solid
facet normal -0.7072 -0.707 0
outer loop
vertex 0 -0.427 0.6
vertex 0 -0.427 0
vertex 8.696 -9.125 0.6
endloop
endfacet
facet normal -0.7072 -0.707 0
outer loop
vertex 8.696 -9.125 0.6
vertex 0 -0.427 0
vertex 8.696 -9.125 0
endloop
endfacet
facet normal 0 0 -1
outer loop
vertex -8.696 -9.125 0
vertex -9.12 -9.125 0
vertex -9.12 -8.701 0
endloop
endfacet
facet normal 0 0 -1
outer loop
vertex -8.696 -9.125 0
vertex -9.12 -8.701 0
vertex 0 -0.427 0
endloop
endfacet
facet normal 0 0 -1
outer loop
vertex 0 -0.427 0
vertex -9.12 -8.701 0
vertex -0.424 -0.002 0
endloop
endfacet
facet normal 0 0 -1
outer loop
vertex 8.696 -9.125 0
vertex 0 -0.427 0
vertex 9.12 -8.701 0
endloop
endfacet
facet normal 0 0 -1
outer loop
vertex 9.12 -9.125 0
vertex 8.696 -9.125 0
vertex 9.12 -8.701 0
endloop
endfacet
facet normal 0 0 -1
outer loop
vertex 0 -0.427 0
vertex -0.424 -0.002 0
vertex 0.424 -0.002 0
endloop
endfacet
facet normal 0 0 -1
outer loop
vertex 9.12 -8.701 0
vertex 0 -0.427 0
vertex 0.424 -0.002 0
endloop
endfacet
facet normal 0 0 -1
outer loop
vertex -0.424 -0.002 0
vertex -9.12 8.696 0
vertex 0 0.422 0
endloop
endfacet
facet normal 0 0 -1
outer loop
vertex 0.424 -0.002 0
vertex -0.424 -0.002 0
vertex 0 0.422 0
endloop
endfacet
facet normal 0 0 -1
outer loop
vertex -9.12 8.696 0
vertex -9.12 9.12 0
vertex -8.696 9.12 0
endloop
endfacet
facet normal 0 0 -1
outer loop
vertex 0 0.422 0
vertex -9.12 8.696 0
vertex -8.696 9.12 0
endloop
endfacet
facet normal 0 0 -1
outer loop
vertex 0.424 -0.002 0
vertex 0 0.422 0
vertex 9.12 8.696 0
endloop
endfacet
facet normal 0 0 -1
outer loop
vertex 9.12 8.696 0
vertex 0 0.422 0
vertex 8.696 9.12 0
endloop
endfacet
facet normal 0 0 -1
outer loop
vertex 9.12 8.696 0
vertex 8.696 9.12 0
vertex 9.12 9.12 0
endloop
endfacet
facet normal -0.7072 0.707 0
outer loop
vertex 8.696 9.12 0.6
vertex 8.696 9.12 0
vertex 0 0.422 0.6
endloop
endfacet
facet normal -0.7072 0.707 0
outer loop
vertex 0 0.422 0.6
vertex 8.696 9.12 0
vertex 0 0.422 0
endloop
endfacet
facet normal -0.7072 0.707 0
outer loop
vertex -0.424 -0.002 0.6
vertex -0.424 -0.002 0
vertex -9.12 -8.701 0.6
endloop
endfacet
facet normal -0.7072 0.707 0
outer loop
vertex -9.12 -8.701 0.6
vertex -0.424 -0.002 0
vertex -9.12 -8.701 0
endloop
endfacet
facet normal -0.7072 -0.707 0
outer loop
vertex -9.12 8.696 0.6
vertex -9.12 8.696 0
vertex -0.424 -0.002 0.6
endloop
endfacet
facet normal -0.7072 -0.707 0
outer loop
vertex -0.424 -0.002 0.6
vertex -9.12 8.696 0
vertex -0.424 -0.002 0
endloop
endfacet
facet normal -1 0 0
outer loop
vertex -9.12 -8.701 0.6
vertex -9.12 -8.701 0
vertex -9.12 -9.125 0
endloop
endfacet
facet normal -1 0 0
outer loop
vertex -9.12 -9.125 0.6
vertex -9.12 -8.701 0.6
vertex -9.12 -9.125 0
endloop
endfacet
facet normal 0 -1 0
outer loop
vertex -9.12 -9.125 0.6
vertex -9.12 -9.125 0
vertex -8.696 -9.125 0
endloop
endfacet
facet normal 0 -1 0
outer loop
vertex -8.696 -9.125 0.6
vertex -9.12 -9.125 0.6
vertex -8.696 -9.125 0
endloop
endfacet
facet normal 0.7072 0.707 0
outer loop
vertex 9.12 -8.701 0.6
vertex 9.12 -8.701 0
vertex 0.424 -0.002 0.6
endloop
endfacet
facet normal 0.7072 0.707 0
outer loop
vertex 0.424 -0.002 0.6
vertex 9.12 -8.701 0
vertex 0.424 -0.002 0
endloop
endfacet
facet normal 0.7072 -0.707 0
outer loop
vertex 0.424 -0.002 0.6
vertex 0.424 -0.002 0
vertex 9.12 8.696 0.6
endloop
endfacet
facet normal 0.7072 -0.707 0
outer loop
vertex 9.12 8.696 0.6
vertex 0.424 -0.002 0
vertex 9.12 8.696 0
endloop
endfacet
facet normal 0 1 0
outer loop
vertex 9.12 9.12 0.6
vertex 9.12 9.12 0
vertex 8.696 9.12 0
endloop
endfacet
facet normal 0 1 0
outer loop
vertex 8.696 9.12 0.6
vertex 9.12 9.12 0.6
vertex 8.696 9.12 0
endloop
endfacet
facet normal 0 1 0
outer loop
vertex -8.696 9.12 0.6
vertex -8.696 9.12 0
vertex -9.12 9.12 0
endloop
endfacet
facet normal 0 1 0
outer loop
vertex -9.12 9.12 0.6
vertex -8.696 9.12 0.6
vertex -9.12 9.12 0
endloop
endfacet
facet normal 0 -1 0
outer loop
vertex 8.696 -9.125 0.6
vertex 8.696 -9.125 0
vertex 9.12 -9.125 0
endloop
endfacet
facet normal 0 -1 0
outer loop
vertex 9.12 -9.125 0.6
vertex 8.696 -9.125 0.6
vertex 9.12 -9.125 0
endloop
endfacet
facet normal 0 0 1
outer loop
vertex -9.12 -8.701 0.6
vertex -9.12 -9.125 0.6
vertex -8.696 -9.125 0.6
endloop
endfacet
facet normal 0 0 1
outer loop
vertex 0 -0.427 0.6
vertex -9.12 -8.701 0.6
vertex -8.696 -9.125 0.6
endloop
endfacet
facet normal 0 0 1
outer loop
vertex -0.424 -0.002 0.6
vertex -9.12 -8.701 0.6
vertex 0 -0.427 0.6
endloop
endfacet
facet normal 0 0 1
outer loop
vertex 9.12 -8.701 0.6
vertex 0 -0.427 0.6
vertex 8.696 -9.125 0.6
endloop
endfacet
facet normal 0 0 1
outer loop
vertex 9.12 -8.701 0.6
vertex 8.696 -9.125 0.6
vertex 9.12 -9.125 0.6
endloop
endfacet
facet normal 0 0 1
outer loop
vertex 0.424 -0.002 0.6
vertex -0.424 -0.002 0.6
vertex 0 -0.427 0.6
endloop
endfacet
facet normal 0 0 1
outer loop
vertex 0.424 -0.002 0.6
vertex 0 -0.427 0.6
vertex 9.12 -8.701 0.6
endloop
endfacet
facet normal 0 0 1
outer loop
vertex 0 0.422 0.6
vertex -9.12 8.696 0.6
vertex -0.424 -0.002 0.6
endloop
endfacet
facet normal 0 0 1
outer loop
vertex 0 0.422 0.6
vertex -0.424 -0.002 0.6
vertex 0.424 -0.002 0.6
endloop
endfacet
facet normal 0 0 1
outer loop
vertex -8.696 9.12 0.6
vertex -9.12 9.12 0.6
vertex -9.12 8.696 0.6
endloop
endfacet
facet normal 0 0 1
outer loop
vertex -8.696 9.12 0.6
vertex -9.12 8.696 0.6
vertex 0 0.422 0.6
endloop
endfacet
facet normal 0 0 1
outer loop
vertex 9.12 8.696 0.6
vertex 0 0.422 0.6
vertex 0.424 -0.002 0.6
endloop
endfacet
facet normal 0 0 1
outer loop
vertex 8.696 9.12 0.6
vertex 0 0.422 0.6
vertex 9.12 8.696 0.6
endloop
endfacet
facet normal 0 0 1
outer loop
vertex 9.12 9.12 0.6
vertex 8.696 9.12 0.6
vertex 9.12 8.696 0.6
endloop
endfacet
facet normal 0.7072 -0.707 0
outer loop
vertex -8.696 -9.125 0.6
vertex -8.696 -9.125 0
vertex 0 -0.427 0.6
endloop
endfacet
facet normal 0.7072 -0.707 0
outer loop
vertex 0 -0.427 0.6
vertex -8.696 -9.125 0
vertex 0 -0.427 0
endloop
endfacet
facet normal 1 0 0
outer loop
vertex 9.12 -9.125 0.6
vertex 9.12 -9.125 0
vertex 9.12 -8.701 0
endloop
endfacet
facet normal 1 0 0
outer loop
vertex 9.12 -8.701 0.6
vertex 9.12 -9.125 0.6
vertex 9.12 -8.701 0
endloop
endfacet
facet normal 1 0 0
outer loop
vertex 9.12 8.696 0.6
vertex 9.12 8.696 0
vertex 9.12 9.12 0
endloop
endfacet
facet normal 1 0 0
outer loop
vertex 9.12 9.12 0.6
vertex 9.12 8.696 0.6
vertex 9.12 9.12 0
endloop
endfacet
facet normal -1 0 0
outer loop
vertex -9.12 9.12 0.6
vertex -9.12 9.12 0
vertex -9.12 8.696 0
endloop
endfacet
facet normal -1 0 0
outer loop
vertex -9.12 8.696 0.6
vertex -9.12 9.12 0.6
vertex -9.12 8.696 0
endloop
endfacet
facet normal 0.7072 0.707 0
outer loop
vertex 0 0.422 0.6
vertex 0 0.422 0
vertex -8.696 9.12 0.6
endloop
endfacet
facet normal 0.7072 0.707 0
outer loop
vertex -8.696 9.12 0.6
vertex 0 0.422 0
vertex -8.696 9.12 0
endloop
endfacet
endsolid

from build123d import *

# Parameters (mm, degrees)
F1_DEPTH = 0.6


with BuildPart() as f1:
    # F0 (on Top) → F1 (new body)
    with BuildSketch(Plane.XY):
        Polygon((-9.12, 9.12), (-9.12, 8.6956777771), (-0.4242059384, -0.0025), (-0.2121029692, 0.2096611115), align=None)
        Polygon((0.2121029692, -0.2146611115), (9.12, -9.125), (9.12, -8.7006777771), (0.4242059384, -0.0025), align=None)
        Polygon((-0.2121029692, 0.2096611115), (0, -0.0025), (0.2121029692, 0.2096611115), (0, 0.4218222229), align=None)
        Polygon((0, -0.4268222229), (8.6957940616, -9.125), (9.12, -9.125), (0.2121029692, -0.2146611115), align=None)
        Polygon((-8.6957940616, 9.12), (-9.12, 9.12), (-0.2121029692, 0.2096611115), (0, 0.4218222229), align=None)
        Polygon((0, -0.0025), (-0.2121029692, -0.2146611115), (0, -0.4268222229), (0.2121029692, -0.2146611115), align=None)
        Polygon((-0.4242059384, -0.0025), (-0.2121029692, -0.2146611115), (0, -0.0025), (-0.2121029692, 0.2096611115), align=None)
        Polygon((-0.2121029692, -0.2146611115), (-9.12, -9.125), (-8.6957940616, -9.125), (0, -0.4268222229), align=None)
        Polygon((9.12, 9.12), (0.2121029692, 0.2096611115), (0.4242059384, -0.0025), (9.12, 8.6956777771), align=None)
        Polygon((-9.12, -8.7006777771), (-9.12, -9.125), (-0.2121029692, -0.2146611115), (-0.4242059384, -0.0025), align=None)
        Polygon((0.2121029692, 0.2096611115), (0, -0.0025), (0.2121029692, -0.2146611115), (0.4242059384, -0.0025), align=None)
        Polygon((0, 0.4218222229), (0.2121029692, 0.2096611115), (9.12, 9.12), (8.6957940616, 9.12), align=None)
    extrude(amount=F1_DEPTH)


solid = f1.part
